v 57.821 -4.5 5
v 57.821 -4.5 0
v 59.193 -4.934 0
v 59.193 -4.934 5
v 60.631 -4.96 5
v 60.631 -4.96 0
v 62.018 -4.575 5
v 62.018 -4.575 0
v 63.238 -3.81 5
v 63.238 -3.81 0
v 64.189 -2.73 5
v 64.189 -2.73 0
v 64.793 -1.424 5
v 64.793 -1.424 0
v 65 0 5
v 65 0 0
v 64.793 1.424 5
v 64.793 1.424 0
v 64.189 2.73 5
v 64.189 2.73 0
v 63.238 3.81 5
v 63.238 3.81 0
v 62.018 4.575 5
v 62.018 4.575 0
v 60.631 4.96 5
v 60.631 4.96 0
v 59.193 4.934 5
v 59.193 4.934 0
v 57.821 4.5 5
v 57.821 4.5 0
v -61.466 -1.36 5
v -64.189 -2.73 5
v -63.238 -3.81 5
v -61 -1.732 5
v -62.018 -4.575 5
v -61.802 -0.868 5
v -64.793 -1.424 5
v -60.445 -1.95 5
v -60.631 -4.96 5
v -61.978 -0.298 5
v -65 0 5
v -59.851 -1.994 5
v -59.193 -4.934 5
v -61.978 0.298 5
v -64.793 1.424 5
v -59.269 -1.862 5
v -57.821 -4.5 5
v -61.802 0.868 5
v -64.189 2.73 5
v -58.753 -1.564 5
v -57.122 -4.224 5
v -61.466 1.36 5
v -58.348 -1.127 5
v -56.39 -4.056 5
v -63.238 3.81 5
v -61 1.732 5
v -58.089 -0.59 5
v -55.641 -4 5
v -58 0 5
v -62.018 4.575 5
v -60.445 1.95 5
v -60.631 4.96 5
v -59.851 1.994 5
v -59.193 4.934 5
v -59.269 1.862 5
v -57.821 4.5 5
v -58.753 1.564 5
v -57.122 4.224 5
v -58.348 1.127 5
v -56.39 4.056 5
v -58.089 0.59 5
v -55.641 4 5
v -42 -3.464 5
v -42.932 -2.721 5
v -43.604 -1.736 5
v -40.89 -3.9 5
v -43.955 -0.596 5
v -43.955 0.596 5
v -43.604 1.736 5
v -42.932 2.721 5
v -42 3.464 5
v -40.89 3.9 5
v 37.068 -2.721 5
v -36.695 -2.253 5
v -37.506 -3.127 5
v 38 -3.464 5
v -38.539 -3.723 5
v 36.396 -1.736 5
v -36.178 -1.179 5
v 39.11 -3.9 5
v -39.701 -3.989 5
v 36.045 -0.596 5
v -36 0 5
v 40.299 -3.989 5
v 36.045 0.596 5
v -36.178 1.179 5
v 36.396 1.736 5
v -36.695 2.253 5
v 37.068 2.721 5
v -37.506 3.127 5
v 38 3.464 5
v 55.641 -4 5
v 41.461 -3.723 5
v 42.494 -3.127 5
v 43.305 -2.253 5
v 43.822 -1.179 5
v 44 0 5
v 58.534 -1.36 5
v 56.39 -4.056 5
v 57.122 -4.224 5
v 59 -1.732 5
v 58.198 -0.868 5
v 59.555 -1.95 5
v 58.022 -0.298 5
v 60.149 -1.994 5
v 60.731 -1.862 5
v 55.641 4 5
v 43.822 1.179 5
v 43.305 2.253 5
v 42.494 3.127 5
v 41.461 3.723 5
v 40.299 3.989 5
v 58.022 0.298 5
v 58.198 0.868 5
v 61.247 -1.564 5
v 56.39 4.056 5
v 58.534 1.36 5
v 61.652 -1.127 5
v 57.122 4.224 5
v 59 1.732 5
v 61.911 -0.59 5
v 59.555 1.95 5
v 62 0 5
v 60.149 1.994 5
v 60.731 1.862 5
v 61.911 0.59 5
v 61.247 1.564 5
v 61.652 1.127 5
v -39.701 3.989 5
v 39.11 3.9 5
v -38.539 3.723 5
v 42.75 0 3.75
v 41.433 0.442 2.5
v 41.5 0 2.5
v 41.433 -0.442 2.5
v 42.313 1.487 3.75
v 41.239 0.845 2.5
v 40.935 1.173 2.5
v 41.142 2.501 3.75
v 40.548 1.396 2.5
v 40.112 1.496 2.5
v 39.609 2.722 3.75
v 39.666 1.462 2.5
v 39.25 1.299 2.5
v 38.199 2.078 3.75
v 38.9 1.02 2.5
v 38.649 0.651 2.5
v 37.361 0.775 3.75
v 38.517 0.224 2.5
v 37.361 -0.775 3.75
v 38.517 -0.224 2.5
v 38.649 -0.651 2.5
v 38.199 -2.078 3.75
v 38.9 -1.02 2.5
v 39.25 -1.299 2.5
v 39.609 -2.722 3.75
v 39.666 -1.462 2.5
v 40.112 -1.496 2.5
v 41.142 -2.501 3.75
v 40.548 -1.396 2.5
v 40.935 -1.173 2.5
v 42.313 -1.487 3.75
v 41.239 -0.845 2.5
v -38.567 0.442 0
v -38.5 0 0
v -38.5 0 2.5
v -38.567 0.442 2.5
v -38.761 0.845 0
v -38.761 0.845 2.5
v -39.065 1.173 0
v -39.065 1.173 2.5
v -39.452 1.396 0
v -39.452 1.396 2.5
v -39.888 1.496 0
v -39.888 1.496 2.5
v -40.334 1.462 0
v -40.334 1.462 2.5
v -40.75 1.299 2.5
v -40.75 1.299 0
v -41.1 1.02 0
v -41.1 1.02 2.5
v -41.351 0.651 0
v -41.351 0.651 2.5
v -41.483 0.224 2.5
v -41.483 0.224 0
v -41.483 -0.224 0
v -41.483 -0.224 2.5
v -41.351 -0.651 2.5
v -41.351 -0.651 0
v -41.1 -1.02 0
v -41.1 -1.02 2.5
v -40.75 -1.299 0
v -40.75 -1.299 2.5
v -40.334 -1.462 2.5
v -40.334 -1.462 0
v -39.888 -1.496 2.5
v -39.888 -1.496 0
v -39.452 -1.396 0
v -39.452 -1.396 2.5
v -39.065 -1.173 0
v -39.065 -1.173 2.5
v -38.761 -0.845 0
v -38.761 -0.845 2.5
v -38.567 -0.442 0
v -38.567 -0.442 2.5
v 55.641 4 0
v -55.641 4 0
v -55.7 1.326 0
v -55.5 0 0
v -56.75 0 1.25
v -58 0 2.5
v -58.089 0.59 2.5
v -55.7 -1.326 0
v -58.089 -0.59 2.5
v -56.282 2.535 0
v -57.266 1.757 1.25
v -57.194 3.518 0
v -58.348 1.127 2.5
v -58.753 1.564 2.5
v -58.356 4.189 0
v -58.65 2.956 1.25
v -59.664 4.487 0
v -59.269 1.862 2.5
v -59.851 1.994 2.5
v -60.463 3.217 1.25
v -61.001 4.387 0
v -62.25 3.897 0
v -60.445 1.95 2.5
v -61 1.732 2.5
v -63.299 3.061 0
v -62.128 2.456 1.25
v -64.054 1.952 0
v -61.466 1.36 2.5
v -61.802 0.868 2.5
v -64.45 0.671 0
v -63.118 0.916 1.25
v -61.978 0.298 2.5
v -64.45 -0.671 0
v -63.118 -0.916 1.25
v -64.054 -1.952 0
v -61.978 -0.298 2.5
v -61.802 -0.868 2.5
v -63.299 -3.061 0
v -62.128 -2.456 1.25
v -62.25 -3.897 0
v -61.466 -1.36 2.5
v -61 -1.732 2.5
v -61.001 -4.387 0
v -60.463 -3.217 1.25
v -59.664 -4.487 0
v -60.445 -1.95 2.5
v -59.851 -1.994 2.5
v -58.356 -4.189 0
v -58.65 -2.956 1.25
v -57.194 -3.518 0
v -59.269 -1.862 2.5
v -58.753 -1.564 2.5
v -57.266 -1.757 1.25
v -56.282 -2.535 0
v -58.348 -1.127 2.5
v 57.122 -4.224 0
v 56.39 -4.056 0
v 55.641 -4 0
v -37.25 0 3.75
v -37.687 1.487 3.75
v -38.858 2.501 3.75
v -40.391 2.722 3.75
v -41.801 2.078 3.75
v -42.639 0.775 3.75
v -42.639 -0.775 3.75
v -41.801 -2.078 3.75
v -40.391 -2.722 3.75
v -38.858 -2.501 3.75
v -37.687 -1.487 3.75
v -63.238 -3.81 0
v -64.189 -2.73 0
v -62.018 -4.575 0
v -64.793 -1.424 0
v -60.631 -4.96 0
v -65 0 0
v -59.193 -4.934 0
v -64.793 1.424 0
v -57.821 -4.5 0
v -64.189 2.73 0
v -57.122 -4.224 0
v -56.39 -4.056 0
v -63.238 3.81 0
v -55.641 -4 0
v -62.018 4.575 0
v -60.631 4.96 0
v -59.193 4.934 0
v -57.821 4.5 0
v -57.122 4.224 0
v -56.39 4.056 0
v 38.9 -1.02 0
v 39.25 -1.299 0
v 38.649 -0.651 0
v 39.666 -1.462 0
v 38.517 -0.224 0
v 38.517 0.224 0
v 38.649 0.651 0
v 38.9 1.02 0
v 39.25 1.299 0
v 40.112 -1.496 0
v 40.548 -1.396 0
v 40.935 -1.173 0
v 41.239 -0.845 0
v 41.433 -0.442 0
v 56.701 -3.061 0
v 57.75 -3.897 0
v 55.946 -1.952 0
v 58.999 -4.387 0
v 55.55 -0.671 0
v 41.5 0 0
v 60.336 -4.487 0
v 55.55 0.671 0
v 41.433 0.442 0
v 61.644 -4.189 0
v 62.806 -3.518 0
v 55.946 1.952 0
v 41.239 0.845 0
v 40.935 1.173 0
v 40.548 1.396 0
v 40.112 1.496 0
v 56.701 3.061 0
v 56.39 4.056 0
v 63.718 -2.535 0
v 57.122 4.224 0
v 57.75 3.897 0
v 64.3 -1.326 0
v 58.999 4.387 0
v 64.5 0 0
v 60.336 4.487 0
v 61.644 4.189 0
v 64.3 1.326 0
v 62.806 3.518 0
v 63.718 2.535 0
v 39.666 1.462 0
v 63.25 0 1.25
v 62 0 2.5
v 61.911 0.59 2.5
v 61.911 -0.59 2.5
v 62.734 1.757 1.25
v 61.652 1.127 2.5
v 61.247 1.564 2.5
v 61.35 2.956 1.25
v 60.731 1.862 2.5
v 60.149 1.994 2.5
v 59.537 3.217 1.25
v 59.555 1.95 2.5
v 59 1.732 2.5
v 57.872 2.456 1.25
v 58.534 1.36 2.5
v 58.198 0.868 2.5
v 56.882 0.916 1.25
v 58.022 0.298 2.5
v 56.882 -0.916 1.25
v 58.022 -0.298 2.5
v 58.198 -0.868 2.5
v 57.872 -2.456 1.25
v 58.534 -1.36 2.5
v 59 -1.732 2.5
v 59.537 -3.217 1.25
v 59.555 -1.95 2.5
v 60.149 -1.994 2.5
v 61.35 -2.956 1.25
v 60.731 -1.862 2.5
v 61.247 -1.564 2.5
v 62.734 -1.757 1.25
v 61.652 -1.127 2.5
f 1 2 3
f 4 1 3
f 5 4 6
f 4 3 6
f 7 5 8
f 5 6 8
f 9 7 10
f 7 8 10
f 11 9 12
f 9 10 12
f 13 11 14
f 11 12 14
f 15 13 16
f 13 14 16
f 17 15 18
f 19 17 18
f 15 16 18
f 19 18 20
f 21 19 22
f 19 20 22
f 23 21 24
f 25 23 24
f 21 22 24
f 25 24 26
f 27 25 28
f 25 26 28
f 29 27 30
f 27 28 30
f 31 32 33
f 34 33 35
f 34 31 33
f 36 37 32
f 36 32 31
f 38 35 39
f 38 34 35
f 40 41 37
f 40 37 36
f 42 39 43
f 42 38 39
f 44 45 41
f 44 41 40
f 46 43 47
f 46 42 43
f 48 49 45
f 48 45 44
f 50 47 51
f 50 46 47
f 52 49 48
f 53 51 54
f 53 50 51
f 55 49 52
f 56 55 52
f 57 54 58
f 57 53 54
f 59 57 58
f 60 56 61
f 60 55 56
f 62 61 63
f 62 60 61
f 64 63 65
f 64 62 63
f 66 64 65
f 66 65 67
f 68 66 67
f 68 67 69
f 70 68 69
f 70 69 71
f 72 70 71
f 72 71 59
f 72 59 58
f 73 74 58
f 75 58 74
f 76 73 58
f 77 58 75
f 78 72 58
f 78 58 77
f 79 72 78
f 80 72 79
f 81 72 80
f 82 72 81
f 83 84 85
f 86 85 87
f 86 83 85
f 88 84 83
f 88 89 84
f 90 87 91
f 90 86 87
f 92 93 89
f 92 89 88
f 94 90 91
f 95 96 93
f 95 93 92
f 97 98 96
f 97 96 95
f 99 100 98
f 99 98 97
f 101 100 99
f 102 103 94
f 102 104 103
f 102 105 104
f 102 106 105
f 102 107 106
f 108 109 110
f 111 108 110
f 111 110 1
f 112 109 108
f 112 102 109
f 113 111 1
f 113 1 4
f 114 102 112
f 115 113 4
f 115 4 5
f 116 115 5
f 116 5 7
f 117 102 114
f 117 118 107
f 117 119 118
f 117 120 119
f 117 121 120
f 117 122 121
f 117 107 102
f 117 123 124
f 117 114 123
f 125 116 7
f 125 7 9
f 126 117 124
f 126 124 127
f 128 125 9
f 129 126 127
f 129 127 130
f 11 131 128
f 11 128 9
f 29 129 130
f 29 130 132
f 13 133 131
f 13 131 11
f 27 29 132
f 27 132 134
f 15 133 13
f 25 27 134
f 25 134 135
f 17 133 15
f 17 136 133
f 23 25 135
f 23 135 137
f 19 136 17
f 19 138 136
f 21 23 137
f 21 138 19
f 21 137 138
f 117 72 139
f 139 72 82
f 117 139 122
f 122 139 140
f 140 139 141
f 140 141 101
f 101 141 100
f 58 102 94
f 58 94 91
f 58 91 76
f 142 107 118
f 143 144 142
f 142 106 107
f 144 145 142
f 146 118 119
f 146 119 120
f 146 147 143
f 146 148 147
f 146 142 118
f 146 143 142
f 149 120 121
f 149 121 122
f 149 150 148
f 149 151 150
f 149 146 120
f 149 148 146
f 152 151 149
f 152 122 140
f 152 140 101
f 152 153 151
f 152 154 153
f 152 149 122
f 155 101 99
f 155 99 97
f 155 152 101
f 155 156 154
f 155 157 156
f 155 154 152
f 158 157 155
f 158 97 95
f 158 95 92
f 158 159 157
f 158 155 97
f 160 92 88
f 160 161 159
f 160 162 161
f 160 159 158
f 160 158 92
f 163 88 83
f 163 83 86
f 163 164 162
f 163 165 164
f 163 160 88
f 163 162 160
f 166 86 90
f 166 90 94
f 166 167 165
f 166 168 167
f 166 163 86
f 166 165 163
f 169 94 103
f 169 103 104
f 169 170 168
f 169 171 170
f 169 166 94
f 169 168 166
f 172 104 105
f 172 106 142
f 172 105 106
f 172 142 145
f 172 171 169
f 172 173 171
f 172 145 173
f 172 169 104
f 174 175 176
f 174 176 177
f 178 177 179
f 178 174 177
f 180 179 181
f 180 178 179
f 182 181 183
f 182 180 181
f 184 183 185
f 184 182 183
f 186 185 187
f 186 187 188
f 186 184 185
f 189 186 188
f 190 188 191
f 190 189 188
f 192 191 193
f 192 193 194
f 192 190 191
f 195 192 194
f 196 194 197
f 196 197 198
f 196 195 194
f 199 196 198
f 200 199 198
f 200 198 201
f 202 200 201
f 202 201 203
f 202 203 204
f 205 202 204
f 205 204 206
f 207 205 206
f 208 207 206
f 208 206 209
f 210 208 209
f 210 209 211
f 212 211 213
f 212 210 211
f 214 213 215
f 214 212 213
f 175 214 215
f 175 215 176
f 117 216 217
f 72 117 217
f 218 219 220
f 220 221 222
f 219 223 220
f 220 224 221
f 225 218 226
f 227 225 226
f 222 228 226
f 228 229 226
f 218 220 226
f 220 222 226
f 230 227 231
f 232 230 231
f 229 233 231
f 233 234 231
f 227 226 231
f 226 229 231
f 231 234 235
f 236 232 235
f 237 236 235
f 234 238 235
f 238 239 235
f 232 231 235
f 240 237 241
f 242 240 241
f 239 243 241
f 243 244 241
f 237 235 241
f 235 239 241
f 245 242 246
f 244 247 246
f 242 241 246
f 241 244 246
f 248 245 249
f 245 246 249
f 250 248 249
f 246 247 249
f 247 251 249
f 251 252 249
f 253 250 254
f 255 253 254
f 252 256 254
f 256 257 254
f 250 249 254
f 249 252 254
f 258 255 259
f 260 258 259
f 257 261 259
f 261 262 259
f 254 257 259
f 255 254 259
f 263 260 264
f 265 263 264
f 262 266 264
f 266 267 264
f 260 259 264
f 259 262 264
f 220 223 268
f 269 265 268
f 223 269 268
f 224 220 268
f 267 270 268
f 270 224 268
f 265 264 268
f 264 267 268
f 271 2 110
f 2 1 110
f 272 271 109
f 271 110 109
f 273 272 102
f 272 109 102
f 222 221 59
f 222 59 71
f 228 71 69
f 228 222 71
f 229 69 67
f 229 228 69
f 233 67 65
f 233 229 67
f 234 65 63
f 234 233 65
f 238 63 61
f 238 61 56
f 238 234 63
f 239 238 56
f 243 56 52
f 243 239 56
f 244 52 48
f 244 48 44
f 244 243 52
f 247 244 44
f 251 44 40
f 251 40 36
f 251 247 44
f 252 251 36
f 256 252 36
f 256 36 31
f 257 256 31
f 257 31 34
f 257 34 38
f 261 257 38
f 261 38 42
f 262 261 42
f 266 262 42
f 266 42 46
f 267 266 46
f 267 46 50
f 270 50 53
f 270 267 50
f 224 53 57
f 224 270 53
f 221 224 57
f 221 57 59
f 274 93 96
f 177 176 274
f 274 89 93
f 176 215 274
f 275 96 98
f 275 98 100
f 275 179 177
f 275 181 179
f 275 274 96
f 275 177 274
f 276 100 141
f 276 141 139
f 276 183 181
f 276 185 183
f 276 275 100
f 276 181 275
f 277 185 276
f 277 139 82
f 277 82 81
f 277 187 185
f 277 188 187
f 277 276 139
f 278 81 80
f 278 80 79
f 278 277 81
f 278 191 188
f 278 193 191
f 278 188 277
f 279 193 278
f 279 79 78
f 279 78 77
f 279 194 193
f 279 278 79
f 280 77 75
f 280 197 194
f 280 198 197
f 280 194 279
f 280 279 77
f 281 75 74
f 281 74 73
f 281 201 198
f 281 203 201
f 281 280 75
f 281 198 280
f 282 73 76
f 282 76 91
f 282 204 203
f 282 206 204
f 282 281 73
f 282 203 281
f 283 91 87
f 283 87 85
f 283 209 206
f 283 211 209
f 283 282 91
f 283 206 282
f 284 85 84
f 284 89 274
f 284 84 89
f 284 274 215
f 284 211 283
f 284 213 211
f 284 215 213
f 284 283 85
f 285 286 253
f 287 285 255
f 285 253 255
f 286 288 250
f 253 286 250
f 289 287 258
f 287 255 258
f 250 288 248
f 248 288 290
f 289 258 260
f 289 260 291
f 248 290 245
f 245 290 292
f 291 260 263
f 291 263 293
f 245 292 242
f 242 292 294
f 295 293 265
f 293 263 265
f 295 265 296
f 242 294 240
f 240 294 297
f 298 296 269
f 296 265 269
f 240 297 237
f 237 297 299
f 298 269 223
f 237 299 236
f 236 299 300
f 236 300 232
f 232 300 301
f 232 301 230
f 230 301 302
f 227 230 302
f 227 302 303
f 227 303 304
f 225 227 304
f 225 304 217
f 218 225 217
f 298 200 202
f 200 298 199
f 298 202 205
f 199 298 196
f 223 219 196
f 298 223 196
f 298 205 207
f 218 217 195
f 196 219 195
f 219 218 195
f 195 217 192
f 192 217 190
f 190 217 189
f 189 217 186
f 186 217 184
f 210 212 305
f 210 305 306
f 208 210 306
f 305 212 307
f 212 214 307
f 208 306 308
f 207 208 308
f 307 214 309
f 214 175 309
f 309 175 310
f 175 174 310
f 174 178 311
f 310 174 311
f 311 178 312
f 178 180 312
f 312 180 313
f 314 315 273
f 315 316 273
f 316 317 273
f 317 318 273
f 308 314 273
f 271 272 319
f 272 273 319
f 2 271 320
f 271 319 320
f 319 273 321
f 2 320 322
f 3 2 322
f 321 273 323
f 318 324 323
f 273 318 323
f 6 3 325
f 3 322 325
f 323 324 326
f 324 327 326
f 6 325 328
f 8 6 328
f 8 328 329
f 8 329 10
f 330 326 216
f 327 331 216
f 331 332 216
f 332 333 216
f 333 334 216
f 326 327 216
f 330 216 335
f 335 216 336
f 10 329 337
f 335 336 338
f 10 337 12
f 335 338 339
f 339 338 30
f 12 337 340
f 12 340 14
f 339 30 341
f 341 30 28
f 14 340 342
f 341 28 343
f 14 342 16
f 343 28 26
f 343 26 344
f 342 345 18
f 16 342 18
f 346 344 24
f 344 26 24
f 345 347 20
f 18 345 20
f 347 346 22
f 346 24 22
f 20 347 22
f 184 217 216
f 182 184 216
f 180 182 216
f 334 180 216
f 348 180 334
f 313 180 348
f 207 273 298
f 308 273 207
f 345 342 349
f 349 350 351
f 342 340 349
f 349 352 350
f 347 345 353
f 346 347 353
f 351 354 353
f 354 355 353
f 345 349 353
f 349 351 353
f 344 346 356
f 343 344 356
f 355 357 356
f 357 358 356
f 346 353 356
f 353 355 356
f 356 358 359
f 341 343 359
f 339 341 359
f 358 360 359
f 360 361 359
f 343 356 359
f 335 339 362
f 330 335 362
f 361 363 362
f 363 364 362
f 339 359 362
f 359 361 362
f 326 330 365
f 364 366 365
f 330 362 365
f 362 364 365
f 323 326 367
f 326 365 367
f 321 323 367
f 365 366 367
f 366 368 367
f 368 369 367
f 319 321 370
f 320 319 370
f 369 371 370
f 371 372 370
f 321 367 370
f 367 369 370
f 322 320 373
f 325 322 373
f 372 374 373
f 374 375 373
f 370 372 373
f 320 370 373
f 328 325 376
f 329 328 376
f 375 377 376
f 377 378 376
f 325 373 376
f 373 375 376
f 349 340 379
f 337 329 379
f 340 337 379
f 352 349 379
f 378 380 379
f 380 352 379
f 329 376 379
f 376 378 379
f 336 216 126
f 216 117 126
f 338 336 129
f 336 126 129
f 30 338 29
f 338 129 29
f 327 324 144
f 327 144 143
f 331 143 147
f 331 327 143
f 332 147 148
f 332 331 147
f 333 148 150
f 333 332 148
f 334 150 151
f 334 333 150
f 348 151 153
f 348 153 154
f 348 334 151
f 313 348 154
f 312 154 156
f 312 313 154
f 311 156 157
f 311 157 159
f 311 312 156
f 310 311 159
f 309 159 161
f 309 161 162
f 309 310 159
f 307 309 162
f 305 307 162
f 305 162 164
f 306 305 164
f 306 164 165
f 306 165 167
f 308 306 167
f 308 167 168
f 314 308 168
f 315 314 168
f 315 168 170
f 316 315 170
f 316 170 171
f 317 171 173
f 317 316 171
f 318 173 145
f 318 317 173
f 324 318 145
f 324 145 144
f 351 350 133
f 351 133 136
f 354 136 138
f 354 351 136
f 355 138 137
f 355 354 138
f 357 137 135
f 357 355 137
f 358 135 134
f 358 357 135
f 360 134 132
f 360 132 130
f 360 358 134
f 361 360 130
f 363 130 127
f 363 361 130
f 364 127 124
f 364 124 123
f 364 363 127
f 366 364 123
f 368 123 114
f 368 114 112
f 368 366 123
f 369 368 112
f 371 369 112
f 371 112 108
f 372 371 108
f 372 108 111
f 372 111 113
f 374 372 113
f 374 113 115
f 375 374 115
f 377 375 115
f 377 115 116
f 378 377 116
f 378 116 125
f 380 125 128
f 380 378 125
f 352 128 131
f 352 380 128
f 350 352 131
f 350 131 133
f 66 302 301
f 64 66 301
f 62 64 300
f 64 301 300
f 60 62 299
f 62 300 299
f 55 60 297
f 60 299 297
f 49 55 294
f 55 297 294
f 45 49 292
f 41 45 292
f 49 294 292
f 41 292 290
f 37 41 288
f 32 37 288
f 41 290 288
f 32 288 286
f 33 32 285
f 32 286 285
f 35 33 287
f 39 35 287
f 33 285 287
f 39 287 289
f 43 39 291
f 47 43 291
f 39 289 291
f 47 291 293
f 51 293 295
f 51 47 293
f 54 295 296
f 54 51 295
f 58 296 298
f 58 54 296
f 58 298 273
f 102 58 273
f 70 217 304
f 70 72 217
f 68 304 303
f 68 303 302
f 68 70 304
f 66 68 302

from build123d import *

# Parameters (mm, degrees)
F0_R     = 1.5
F0_R_2   = 2
F1_DEPTH = 5
F2_R     = 5
F3_SIZE2 = 2.49999
F3_SIZE  = 2.49999


# Not quite as in the source:
# - a fillet or chamfer is up to 0.001 mm smaller than in the source, because OpenCascade refuses the exact size


with BuildPart() as f1:
    # F0 (on Top) → F1 (new body)
    with BuildSketch(Plane.XY):
        with BuildLine():
            Line((57, 4), (0, 4))
            Line((0, 4), (0, -4))
            Line((0, -4), (57, -4))
            ThreePointArc((57, -4), (65, 0), (57, 4))
        make_face()
        with Locations((40, 0)):
            Circle(F0_R, mode=Mode.SUBTRACT)
        with Locations((60, 0)):
            Circle(F0_R_2, mode=Mode.SUBTRACT)
        with BuildLine():
            Line((0, 4), (-57, 4))
            ThreePointArc((-57, 4), (-65, 0), (-57, -4))
            Line((-57, -4), (0, -4))
            Line((0, -4), (0, 4))
        make_face()
        with Locations((-60, 0)):
            Circle(F0_R_2, mode=Mode.SUBTRACT)
        with Locations((-40, 0)):
            Circle(F0_R, mode=Mode.SUBTRACT)
    extrude(amount=F1_DEPTH)

    # F2
    f2_edges = [f1.edges().sort_by_distance(p)[0] for p in [
        (-57, 4, 2.5),
        (-57, -4, 2.5),
        (57, -4, 2.5),
        (57, 4, 2.5),
    ]]
    fillet(f2_edges, radius=F2_R)

    # F3 (size 2.5 and 2.5 in the source; OpenCascade refuses exactly that, so slightly less here)
    f3_edges = [f1.edges().sort_by_distance(p)[0] for p in [
        (38.5, 0, 5),
        (-41.5, 0, 5),
        (-62, 0, 0),
        (58, 0, 0),
    ]]
    chamfer(f3_edges, length=F3_SIZE, length2=F3_SIZE2)


solid = f1.part
